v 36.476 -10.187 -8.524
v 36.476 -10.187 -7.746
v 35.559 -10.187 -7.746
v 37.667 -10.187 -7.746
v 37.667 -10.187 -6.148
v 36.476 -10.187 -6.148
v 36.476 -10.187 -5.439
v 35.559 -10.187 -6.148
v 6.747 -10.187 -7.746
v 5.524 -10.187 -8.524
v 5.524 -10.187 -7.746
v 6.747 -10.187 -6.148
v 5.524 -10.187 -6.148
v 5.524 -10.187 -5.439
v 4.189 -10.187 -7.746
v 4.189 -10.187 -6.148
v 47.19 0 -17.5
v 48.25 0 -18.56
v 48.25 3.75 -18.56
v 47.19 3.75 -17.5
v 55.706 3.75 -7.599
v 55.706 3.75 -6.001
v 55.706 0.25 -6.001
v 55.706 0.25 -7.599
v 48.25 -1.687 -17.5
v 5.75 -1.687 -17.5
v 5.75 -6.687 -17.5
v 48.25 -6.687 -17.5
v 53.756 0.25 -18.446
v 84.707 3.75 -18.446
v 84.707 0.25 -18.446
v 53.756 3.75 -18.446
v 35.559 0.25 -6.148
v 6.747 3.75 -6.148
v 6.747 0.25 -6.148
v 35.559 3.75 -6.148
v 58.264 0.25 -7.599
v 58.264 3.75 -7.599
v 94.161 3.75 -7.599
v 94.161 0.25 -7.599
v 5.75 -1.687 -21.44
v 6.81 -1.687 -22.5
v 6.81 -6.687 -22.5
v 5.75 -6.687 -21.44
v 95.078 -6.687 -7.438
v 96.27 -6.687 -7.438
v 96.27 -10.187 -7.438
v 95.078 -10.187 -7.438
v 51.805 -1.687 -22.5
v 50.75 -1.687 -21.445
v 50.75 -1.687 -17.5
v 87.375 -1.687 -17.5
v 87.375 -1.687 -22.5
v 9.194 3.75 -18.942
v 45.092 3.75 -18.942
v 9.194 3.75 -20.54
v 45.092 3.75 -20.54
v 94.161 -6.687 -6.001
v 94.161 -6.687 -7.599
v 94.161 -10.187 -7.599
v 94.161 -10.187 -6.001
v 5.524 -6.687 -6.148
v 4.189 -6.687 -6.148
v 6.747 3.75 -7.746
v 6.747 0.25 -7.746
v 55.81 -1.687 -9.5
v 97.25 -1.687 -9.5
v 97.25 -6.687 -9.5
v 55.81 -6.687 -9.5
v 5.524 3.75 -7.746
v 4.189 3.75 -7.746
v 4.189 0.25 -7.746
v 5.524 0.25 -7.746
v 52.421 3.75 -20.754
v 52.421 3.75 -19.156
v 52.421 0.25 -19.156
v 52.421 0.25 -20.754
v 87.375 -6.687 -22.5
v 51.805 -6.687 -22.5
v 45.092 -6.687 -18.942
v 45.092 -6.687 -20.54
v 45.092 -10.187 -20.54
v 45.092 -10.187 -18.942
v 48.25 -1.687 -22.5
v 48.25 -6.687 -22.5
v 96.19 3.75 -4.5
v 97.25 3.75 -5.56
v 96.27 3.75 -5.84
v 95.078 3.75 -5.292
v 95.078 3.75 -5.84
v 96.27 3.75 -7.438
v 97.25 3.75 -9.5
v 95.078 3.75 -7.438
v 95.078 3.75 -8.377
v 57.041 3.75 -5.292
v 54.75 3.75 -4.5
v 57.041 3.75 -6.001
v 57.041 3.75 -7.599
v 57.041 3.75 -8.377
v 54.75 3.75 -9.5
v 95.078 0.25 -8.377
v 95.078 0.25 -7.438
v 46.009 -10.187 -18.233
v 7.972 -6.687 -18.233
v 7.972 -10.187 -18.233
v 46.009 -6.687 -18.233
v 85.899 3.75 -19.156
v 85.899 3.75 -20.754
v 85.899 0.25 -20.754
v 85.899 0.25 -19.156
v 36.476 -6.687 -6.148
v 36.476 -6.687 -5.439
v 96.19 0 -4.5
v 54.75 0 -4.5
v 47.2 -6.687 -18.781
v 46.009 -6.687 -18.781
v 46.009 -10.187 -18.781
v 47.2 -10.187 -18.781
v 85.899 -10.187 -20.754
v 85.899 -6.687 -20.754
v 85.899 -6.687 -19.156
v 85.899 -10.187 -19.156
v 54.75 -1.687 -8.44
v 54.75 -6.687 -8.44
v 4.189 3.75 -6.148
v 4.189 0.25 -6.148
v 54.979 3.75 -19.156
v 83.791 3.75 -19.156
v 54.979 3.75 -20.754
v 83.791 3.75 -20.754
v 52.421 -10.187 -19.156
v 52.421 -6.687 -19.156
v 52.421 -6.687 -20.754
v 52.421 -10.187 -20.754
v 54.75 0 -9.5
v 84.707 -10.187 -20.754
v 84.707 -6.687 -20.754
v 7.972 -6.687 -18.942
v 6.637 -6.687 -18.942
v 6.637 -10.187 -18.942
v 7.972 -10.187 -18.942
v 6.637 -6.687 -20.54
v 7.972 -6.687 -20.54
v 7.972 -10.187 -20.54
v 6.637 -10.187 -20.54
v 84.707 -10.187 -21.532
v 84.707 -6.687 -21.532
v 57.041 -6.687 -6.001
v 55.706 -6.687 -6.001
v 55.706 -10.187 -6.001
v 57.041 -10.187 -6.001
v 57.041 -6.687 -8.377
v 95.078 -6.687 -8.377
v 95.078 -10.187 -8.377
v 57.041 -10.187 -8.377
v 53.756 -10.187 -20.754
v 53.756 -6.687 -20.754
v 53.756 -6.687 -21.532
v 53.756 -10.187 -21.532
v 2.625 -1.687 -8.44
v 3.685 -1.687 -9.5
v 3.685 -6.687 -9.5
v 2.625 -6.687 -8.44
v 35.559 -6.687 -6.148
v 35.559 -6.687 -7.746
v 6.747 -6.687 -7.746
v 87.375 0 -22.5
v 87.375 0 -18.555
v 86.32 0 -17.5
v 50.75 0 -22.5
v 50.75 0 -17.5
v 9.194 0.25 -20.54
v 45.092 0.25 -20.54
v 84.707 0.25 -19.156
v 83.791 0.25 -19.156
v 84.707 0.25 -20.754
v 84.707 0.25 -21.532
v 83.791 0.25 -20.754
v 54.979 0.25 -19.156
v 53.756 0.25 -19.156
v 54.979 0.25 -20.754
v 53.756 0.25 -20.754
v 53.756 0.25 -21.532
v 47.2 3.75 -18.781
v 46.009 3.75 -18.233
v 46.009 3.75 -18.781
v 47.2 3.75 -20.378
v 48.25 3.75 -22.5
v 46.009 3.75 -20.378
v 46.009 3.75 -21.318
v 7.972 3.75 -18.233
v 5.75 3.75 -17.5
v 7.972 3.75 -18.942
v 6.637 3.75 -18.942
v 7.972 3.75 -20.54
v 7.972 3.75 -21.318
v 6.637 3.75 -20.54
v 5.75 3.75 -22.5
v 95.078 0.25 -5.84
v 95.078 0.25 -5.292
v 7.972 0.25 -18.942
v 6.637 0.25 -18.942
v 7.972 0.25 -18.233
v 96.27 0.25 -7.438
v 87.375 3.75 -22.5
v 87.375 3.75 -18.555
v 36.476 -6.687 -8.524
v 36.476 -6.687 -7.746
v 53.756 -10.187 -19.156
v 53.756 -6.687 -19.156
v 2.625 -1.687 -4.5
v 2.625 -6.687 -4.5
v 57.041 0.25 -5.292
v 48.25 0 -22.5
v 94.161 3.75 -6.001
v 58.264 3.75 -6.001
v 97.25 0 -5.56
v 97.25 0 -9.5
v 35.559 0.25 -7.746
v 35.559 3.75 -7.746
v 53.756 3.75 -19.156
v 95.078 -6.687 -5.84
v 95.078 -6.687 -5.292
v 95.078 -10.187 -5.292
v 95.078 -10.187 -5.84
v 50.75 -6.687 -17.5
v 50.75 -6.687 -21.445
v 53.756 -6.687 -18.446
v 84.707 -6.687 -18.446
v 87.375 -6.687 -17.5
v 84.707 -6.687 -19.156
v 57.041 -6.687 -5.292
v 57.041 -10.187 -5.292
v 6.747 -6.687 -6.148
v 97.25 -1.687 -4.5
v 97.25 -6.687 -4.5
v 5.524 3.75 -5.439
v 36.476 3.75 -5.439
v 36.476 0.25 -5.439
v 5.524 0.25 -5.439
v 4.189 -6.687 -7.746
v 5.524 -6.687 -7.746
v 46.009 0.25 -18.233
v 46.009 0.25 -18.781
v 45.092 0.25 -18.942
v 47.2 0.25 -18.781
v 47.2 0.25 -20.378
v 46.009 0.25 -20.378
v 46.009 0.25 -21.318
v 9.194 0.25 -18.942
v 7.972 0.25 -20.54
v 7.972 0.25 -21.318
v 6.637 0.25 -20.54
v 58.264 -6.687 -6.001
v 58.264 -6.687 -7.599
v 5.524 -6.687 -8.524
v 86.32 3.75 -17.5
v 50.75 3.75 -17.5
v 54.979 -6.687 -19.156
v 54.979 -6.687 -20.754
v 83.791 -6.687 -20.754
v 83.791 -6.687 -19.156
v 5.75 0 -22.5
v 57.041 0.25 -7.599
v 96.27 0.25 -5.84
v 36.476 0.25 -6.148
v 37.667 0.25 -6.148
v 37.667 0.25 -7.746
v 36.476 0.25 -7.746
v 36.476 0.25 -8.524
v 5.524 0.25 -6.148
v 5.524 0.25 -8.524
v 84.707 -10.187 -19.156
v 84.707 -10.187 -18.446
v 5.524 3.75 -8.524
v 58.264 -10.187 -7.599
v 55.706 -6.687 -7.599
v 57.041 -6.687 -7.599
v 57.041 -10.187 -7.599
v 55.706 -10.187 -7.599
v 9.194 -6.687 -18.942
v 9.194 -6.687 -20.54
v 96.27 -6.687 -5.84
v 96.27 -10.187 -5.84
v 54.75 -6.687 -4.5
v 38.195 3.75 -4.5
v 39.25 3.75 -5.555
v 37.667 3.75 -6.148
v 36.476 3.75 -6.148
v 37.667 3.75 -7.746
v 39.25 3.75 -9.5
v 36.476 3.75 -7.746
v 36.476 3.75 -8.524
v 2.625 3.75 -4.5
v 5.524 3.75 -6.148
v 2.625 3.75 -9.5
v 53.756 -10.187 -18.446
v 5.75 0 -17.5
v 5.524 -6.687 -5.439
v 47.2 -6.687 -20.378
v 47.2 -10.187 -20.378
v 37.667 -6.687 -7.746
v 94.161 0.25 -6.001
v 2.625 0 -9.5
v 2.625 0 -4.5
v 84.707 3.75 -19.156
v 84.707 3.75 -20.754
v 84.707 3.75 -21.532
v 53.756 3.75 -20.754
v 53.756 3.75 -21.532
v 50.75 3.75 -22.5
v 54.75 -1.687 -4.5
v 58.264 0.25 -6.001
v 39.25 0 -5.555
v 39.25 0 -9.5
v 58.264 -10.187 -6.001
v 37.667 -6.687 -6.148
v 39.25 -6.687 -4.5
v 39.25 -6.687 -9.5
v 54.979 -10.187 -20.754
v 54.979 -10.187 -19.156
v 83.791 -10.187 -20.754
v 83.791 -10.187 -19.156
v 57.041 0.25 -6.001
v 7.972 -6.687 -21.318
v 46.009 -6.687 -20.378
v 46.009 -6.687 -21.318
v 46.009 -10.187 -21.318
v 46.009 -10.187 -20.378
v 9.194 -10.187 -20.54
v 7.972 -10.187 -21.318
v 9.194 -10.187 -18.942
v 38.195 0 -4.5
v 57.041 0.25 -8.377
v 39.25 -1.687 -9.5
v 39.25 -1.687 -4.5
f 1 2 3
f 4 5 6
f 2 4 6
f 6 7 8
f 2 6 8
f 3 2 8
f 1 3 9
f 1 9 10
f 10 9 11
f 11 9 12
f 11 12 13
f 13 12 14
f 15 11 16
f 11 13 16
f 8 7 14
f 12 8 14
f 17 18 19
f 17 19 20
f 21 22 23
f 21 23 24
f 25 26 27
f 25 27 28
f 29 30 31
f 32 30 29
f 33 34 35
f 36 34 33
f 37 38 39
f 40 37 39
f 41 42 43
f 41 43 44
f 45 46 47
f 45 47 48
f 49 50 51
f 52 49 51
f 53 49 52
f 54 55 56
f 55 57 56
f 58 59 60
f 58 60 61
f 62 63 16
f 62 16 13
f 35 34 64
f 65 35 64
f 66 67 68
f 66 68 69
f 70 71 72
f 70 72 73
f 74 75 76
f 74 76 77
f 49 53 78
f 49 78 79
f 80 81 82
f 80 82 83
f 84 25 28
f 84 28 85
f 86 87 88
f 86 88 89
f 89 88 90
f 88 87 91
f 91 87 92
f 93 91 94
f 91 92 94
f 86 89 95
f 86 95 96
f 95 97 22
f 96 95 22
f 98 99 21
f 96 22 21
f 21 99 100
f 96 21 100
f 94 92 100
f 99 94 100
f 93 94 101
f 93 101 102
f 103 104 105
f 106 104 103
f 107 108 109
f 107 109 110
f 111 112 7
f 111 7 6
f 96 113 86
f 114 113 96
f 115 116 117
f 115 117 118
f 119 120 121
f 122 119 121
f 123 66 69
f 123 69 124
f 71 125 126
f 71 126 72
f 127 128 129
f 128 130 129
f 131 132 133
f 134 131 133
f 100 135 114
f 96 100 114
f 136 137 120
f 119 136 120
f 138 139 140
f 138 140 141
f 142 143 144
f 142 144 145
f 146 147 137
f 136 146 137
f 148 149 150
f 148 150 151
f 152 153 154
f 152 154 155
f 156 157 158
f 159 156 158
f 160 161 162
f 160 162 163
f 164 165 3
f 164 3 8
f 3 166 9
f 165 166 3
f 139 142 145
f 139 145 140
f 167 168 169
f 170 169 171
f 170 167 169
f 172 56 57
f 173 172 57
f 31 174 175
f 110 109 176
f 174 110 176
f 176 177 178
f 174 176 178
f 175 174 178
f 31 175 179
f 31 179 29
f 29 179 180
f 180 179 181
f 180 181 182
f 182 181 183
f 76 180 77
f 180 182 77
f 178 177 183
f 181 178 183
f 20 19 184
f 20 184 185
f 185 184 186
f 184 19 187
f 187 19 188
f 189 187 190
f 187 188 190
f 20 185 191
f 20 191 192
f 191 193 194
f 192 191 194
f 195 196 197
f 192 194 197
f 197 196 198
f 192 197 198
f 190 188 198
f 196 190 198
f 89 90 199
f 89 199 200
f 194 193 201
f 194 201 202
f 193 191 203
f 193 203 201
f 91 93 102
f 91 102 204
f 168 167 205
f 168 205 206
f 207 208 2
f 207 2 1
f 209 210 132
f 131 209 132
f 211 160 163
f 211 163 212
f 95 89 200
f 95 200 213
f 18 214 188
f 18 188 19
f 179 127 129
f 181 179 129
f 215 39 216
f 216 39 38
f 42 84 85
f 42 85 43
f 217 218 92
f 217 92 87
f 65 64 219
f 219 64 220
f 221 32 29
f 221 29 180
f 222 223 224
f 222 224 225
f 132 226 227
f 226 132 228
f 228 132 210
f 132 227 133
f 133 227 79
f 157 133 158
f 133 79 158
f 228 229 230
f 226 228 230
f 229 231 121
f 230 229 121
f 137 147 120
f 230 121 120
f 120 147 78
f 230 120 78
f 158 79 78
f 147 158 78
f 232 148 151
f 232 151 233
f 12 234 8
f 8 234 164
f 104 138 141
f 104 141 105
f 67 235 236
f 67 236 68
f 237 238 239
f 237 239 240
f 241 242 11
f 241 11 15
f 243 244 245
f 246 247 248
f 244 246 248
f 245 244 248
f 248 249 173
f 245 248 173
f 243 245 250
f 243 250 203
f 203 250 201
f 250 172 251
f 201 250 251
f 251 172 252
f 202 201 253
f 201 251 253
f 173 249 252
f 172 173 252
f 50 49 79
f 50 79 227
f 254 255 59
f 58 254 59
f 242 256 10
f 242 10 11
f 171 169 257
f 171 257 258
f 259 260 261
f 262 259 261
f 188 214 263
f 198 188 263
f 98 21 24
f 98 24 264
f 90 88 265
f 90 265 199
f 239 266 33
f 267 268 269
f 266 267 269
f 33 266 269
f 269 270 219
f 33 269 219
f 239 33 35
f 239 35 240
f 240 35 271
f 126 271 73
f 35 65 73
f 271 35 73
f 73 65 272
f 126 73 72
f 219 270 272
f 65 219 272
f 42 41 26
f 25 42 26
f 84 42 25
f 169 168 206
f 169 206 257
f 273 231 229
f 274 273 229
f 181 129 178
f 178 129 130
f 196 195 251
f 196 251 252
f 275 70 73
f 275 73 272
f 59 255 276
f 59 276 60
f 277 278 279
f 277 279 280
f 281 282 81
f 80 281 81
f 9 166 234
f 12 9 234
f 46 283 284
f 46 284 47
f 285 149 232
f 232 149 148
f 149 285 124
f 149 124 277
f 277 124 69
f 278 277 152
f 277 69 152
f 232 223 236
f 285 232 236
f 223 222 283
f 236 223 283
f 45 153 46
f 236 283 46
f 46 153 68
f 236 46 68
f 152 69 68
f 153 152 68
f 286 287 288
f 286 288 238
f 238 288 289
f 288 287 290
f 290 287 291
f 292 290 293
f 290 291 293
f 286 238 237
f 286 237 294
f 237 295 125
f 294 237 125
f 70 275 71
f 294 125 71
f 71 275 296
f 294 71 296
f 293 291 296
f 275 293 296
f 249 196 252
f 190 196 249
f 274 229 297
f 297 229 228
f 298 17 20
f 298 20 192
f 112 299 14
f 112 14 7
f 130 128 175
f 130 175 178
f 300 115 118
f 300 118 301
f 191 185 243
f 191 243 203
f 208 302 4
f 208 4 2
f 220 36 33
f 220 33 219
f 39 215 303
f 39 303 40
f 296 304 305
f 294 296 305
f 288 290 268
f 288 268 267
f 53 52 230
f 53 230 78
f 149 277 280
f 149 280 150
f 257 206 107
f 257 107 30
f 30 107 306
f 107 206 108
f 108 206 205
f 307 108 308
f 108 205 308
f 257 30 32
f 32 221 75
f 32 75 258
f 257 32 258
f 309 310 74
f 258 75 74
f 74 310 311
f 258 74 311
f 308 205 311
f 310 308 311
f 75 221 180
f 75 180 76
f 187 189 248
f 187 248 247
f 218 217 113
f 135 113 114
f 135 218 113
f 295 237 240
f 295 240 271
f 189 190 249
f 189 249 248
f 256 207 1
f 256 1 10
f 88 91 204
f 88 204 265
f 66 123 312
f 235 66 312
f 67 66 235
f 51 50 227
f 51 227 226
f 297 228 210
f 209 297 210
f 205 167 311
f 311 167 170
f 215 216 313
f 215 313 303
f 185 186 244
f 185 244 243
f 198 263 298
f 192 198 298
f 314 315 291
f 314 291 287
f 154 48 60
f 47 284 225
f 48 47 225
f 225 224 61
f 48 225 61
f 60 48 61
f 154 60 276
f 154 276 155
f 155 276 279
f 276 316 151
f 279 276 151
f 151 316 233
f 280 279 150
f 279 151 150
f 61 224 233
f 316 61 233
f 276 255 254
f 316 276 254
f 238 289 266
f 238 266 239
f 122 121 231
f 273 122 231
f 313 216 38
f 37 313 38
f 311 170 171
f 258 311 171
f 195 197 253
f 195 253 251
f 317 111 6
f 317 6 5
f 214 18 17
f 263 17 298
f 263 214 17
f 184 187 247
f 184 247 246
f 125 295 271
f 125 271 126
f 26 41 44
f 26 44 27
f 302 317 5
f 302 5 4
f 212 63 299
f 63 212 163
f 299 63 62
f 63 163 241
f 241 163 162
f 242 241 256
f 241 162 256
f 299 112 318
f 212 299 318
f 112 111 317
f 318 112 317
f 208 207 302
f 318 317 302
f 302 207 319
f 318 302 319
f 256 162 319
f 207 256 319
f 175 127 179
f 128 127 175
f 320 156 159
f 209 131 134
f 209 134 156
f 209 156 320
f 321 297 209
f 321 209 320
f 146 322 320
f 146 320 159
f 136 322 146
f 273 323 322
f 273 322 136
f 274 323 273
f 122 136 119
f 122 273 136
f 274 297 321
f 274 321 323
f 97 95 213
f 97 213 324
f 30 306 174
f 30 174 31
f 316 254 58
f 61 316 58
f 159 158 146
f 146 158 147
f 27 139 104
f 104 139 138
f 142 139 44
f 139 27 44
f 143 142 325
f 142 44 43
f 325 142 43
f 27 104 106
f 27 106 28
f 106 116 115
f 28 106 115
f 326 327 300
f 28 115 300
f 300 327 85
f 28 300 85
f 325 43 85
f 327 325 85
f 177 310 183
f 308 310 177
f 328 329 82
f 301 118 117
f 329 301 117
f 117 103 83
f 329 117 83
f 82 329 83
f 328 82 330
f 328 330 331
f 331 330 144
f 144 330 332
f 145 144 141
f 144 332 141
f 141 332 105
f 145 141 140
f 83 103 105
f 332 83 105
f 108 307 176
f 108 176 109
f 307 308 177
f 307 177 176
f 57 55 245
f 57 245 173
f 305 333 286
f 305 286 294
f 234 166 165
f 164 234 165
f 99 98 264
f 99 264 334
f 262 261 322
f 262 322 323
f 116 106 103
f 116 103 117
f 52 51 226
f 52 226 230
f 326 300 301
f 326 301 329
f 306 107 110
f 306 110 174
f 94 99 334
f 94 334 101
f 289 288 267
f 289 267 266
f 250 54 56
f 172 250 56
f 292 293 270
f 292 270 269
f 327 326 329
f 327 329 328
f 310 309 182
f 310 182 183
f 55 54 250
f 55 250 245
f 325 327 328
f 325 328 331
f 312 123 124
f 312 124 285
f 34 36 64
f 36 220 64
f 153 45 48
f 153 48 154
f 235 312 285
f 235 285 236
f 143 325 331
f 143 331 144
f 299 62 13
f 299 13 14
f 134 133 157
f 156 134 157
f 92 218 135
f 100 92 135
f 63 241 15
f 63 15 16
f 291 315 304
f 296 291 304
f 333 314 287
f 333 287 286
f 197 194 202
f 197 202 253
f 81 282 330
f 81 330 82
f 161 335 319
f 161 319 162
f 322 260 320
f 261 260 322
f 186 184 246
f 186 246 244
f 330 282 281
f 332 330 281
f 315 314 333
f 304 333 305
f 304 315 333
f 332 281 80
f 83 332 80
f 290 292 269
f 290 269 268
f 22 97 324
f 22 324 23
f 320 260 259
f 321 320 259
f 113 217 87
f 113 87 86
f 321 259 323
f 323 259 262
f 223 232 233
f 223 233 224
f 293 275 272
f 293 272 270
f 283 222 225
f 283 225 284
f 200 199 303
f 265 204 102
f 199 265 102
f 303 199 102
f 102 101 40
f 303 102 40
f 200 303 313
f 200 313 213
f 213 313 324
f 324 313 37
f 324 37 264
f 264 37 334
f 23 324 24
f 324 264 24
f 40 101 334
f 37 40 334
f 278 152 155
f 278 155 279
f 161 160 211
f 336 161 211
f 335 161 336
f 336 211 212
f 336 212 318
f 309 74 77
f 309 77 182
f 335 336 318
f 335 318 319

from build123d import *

# Parameters (mm, degrees)
SV_DEPTH           = 3.75
SV_2_DEPTH         = 3.75
SV_3_DEPTH         = 3.75
SV_4_DEPTH         = 3.75
SKETCH3_W          = 28.811718275
SKETCH3_H          = 1.597828601
SKETCH3_W_2        = 35.897762959
SKETCH3_W_3        = 35.897762958
CUT_EXTRUDE1_DEPTH = 3.5
SV4_A_DEPTH        = 5
SV4_A_2_DEPTH      = 5
SV4_A_3_DEPTH      = 5
SV4_A_4_DEPTH      = 5
SKETCH7_W          = 35.897762958
SKETCH7_H          = 1.597828601
SKETCH7_W_2        = 28.811718275
SKETCH7_W_3        = 35.897762959
SV4_B_DEPTH        = 3.5


with BuildPart() as part:
    # Sketch1 → SV (new body)
    with BuildSketch(Plane(origin=(0, 0, 0), x_dir=(1, 0, 0), z_dir=(0, 1, 0))):
        Polygon((55.811, 9.5), (97.25, 9.5), (97.25, 5.56), (96.19, 4.5), (54.75, 4.5), (54.75, 8.439), (54.75, 9.5), align=None)
    extrude(amount=SV_DEPTH)


with BuildPart() as body_2:
    # Sketch1 → SV 2 (new body)
    with BuildSketch(Plane(origin=(0, 0, 0), x_dir=(1, 0, 0), z_dir=(0, 1, 0))):
        Polygon((3.686, 9.5), (39.25, 9.5), (39.25, 5.555), (38.195, 4.5), (2.625, 4.5), (2.625, 8.439), (2.625, 9.5), align=None)
    extrude(amount=SV_2_DEPTH)


with BuildPart() as body_3:
    # Sketch1 → SV 3 (new body)
    with BuildSketch(Plane(origin=(0, 0, 0), x_dir=(1, 0, 0), z_dir=(0, 1, 0))):
        Polygon((51.811, 22.5), (87.375, 22.5), (87.375, 18.555), (86.32, 17.5), (50.75, 17.5), (50.75, 21.439), (50.75, 22.5), align=None)
    extrude(amount=SV_3_DEPTH)


with BuildPart() as body_4:
    # Sketch1 → SV 4 (new body)
    with BuildSketch(Plane(origin=(0, 0, 0), x_dir=(1, 0, 0), z_dir=(0, 1, 0))):
        Polygon((6.811, 22.5), (48.25, 22.5), (48.25, 18.56), (47.19, 17.5), (5.75, 17.5), (5.75, 21.439), (5.75, 22.5), align=None)
    extrude(amount=SV_4_DEPTH)


with BuildPart() as cut_extrude1_tool:
    # Sketch3 → Cut-Extrude1 (new body)
    with BuildSketch(Plane(origin=(0, 3.75, 0), x_dir=(1, 0, 0), z_dir=(0, 1, 0))):
        Polygon((4.189336253, 7.745735487), (5.524337048, 7.745735487), (5.524337048, 8.524173538), (36.475691419, 8.524173538), (36.475691419, 7.745735487), (37.666991912, 7.745735487), (37.666991912, 6.147906886), (36.475691419, 6.147906886), (36.475691419, 5.438560322), (5.524337048, 5.438560322), (5.524337048, 6.147906886), (4.189336253, 6.147906886), align=None)
        with Locations((21.152985591, 6.946821187)):
            Rectangle(SKETCH3_W, SKETCH3_H, mode=Mode.SUBTRACT)
        Polygon((52.421116037, 20.753597434), (53.756116831, 20.753597434), (53.756116831, 21.532035485), (84.707471203, 21.532035485), (84.707471203, 20.753597434), (85.898771695, 20.753597434), (85.898771695, 19.155768833), (84.707471203, 19.155768833), (84.707471203, 18.446422269), (53.756116831, 18.446422269), (53.756116831, 19.155768833), (52.421116037, 19.155768833), align=None)
        with Locations((69.384765375, 19.954683133)):
            Rectangle(SKETCH3_W, SKETCH3_H, mode=Mode.SUBTRACT)
        Polygon((55.705906871, 7.599031898), (57.040907666, 7.599031898), (57.040907666, 8.377469948), (95.07830672, 8.377469948), (95.07830672, 7.437727621), (96.269607213, 7.437727621), (96.269607213, 5.83989902), (95.07830672, 5.83989902), (95.07830672, 5.291856733), (57.040907666, 5.291856733), (57.040907666, 6.001203297), (55.705906871, 6.001203297), align=None)
        with Locations((76.21257855, 6.800117597)):
            Rectangle(SKETCH3_W_2, SKETCH3_H, mode=Mode.SUBTRACT)
        Polygon((6.636601859, 20.53972103), (7.971602653, 20.53972103), (7.971602653, 21.318159081), (46.009001708, 21.318159081), (46.009001708, 20.378416754), (47.2003022, 20.378416754), (47.2003022, 18.780588153), (46.009001708, 18.780588153), (46.009001708, 18.232545866), (7.971602653, 18.232545866), (7.971602653, 18.941892429), (6.636601859, 18.941892429), align=None)
        with Locations((27.143273538, 19.74080673)):
            Rectangle(SKETCH3_W_3, SKETCH3_H, mode=Mode.SUBTRACT)
    extrude(amount=-CUT_EXTRUDE1_DEPTH)


with BuildPart() as part_1:
    add(part.part)

    # Cut-Extrude1: cut by cut_extrude1_tool
    add(cut_extrude1_tool.part, mode=Mode.SUBTRACT)


with BuildPart() as body_2_1:
    add(body_2.part)

    # Cut-Extrude1: cut by cut_extrude1_tool
    add(cut_extrude1_tool.part, mode=Mode.SUBTRACT)


with BuildPart() as body_3_1:
    add(body_3.part)

    # Cut-Extrude1: cut by cut_extrude1_tool
    add(cut_extrude1_tool.part, mode=Mode.SUBTRACT)


with BuildPart() as body_4_1:
    add(body_4.part)

    # Cut-Extrude1: cut by cut_extrude1_tool
    add(cut_extrude1_tool.part, mode=Mode.SUBTRACT)


with BuildPart() as body_5:
    # Sketch6 → SV4(a) (new body)
    with BuildSketch(Plane(origin=(0, -1.68656, 0), x_dir=(1, 0, 0), z_dir=(0, 1, 0))):
        Polygon((2.625, 4.5), (38.195, 4.5), (39.25, 4.5), (39.25, 5.555), (39.25, 9.5), (3.685, 9.5), (2.625, 8.44), align=None)
    extrude(amount=-SV4_A_DEPTH)



with BuildPart() as body_6:
    # Sketch6 → SV4_a 2 (new body)
    with BuildSketch(Plane(origin=(0, -1.68656, 0), x_dir=(1, 0, 0), z_dir=(0, 1, 0))):
        Polygon((48.25, 18.56191605), (48.25, 22.5), (6.81, 22.5), (5.75, 21.44), (5.75, 17.5), (47.18808395, 17.5), (48.25, 17.5), align=None)
    extrude(amount=-SV4_A_2_DEPTH)


with BuildPart() as body_7:
    # Sketch6 → SV4_a 3 (new body)
    with BuildSketch(Plane(origin=(0, -1.68656, 0), x_dir=(1, 0, 0), z_dir=(0, 1, 0))):
        Polygon((54.75, 4.5), (96.19, 4.5), (97.25, 4.5), (97.25, 5.56), (97.25, 9.5), (55.81, 9.5), (54.75, 8.44), align=None)
    extrude(amount=-SV4_A_3_DEPTH)


with BuildPart() as body_8:
    # Sketch6 → SV4_a 4 (new body)
    with BuildSketch(Plane(origin=(0, -1.68656, 0), x_dir=(1, 0, 0), z_dir=(0, 1, 0))):
        Polygon((50.75, 17.5), (86.32, 17.5), (87.375, 17.5), (87.375, 18.555), (87.375, 22.5), (51.805, 22.5), (50.75, 21.445), align=None)
    extrude(amount=-SV4_A_4_DEPTH)


with BuildPart() as body_5_1:
    add(body_5.part)

    add(body_6.part)  # SV4(b) merges body 6

    add(body_7.part)  # SV4(b) merges body 7

    add(body_8.part)  # SV4(b) merges body 8
    # Sketch7 → SV4(b) (add)
    with BuildSketch(Plane.XZ.offset(6.68656)):
        Polygon((7.971602653, -21.318159081), (7.971602653, -20.53972103), (6.636601859, -20.53972103), (6.636601859, -18.941892429), (7.971602653, -18.941892429), (7.971602653, -18.232545866), (46.009001708, -18.232545866), (46.009001708, -18.780588153), (47.2003022, -18.780588153), (47.2003022, -20.378416754), (46.009001708, -20.378416754), (46.009001708, -21.318159081), align=None)
        with Locations((27.143273538, -19.74080673)):
            Rectangle(SKETCH7_W, SKETCH7_H, mode=Mode.SUBTRACT)
        Polygon((53.756116831, -21.532035485), (84.707471203, -21.532035485), (84.707471203, -20.753597434), (85.898771695, -20.753597434), (85.898771695, -19.155768833), (84.707471203, -19.155768833), (84.707471203, -18.446422269), (53.756116831, -18.446422269), (53.756116831, -19.155768833), (52.421116037, -19.155768833), (52.421116037, -20.753597434), (53.756116831, -20.753597434), align=None)
        with Locations((69.384765375, -19.954683133)):
            Rectangle(SKETCH7_W_2, SKETCH7_H, mode=Mode.SUBTRACT)
        Polygon((57.040907666, -8.377469948), (57.040907666, -7.599031898), (55.705906871, -7.599031898), (55.705906871, -6.001203297), (57.040907666, -6.001203297), (57.040907666, -5.291856733), (95.07830672, -5.291856733), (95.07830672, -5.83989902), (96.269607213, -5.83989902), (96.269607213, -7.437727621), (95.07830672, -7.437727621), (95.07830672, -8.377469948), align=None)
        with Locations((76.21257855, -6.800117597)):
            Rectangle(SKETCH7_W_3, SKETCH7_H, mode=Mode.SUBTRACT)
        Polygon((4.189336253, -6.147906886), (5.524337048, -6.147906886), (5.524337048, -5.438560322), (36.475691419, -5.438560322), (36.475691419, -6.147906886), (37.666991912, -6.147906886), (37.666991912, -7.745735487), (36.475691419, -7.745735487), (36.475691419, -8.524173538), (5.524337048, -8.524173538), (5.524337048, -7.745735487), (4.189336253, -7.745735487), align=None)
        with Locations((21.152985591, -6.946821187)):
            Rectangle(SKETCH7_W_2, SKETCH7_H, mode=Mode.SUBTRACT)
    extrude(amount=SV4_B_DEPTH)


solid = Compound([part_1.part, body_2_1.part, body_3_1.part, body_4_1.part, body_5_1.part])
